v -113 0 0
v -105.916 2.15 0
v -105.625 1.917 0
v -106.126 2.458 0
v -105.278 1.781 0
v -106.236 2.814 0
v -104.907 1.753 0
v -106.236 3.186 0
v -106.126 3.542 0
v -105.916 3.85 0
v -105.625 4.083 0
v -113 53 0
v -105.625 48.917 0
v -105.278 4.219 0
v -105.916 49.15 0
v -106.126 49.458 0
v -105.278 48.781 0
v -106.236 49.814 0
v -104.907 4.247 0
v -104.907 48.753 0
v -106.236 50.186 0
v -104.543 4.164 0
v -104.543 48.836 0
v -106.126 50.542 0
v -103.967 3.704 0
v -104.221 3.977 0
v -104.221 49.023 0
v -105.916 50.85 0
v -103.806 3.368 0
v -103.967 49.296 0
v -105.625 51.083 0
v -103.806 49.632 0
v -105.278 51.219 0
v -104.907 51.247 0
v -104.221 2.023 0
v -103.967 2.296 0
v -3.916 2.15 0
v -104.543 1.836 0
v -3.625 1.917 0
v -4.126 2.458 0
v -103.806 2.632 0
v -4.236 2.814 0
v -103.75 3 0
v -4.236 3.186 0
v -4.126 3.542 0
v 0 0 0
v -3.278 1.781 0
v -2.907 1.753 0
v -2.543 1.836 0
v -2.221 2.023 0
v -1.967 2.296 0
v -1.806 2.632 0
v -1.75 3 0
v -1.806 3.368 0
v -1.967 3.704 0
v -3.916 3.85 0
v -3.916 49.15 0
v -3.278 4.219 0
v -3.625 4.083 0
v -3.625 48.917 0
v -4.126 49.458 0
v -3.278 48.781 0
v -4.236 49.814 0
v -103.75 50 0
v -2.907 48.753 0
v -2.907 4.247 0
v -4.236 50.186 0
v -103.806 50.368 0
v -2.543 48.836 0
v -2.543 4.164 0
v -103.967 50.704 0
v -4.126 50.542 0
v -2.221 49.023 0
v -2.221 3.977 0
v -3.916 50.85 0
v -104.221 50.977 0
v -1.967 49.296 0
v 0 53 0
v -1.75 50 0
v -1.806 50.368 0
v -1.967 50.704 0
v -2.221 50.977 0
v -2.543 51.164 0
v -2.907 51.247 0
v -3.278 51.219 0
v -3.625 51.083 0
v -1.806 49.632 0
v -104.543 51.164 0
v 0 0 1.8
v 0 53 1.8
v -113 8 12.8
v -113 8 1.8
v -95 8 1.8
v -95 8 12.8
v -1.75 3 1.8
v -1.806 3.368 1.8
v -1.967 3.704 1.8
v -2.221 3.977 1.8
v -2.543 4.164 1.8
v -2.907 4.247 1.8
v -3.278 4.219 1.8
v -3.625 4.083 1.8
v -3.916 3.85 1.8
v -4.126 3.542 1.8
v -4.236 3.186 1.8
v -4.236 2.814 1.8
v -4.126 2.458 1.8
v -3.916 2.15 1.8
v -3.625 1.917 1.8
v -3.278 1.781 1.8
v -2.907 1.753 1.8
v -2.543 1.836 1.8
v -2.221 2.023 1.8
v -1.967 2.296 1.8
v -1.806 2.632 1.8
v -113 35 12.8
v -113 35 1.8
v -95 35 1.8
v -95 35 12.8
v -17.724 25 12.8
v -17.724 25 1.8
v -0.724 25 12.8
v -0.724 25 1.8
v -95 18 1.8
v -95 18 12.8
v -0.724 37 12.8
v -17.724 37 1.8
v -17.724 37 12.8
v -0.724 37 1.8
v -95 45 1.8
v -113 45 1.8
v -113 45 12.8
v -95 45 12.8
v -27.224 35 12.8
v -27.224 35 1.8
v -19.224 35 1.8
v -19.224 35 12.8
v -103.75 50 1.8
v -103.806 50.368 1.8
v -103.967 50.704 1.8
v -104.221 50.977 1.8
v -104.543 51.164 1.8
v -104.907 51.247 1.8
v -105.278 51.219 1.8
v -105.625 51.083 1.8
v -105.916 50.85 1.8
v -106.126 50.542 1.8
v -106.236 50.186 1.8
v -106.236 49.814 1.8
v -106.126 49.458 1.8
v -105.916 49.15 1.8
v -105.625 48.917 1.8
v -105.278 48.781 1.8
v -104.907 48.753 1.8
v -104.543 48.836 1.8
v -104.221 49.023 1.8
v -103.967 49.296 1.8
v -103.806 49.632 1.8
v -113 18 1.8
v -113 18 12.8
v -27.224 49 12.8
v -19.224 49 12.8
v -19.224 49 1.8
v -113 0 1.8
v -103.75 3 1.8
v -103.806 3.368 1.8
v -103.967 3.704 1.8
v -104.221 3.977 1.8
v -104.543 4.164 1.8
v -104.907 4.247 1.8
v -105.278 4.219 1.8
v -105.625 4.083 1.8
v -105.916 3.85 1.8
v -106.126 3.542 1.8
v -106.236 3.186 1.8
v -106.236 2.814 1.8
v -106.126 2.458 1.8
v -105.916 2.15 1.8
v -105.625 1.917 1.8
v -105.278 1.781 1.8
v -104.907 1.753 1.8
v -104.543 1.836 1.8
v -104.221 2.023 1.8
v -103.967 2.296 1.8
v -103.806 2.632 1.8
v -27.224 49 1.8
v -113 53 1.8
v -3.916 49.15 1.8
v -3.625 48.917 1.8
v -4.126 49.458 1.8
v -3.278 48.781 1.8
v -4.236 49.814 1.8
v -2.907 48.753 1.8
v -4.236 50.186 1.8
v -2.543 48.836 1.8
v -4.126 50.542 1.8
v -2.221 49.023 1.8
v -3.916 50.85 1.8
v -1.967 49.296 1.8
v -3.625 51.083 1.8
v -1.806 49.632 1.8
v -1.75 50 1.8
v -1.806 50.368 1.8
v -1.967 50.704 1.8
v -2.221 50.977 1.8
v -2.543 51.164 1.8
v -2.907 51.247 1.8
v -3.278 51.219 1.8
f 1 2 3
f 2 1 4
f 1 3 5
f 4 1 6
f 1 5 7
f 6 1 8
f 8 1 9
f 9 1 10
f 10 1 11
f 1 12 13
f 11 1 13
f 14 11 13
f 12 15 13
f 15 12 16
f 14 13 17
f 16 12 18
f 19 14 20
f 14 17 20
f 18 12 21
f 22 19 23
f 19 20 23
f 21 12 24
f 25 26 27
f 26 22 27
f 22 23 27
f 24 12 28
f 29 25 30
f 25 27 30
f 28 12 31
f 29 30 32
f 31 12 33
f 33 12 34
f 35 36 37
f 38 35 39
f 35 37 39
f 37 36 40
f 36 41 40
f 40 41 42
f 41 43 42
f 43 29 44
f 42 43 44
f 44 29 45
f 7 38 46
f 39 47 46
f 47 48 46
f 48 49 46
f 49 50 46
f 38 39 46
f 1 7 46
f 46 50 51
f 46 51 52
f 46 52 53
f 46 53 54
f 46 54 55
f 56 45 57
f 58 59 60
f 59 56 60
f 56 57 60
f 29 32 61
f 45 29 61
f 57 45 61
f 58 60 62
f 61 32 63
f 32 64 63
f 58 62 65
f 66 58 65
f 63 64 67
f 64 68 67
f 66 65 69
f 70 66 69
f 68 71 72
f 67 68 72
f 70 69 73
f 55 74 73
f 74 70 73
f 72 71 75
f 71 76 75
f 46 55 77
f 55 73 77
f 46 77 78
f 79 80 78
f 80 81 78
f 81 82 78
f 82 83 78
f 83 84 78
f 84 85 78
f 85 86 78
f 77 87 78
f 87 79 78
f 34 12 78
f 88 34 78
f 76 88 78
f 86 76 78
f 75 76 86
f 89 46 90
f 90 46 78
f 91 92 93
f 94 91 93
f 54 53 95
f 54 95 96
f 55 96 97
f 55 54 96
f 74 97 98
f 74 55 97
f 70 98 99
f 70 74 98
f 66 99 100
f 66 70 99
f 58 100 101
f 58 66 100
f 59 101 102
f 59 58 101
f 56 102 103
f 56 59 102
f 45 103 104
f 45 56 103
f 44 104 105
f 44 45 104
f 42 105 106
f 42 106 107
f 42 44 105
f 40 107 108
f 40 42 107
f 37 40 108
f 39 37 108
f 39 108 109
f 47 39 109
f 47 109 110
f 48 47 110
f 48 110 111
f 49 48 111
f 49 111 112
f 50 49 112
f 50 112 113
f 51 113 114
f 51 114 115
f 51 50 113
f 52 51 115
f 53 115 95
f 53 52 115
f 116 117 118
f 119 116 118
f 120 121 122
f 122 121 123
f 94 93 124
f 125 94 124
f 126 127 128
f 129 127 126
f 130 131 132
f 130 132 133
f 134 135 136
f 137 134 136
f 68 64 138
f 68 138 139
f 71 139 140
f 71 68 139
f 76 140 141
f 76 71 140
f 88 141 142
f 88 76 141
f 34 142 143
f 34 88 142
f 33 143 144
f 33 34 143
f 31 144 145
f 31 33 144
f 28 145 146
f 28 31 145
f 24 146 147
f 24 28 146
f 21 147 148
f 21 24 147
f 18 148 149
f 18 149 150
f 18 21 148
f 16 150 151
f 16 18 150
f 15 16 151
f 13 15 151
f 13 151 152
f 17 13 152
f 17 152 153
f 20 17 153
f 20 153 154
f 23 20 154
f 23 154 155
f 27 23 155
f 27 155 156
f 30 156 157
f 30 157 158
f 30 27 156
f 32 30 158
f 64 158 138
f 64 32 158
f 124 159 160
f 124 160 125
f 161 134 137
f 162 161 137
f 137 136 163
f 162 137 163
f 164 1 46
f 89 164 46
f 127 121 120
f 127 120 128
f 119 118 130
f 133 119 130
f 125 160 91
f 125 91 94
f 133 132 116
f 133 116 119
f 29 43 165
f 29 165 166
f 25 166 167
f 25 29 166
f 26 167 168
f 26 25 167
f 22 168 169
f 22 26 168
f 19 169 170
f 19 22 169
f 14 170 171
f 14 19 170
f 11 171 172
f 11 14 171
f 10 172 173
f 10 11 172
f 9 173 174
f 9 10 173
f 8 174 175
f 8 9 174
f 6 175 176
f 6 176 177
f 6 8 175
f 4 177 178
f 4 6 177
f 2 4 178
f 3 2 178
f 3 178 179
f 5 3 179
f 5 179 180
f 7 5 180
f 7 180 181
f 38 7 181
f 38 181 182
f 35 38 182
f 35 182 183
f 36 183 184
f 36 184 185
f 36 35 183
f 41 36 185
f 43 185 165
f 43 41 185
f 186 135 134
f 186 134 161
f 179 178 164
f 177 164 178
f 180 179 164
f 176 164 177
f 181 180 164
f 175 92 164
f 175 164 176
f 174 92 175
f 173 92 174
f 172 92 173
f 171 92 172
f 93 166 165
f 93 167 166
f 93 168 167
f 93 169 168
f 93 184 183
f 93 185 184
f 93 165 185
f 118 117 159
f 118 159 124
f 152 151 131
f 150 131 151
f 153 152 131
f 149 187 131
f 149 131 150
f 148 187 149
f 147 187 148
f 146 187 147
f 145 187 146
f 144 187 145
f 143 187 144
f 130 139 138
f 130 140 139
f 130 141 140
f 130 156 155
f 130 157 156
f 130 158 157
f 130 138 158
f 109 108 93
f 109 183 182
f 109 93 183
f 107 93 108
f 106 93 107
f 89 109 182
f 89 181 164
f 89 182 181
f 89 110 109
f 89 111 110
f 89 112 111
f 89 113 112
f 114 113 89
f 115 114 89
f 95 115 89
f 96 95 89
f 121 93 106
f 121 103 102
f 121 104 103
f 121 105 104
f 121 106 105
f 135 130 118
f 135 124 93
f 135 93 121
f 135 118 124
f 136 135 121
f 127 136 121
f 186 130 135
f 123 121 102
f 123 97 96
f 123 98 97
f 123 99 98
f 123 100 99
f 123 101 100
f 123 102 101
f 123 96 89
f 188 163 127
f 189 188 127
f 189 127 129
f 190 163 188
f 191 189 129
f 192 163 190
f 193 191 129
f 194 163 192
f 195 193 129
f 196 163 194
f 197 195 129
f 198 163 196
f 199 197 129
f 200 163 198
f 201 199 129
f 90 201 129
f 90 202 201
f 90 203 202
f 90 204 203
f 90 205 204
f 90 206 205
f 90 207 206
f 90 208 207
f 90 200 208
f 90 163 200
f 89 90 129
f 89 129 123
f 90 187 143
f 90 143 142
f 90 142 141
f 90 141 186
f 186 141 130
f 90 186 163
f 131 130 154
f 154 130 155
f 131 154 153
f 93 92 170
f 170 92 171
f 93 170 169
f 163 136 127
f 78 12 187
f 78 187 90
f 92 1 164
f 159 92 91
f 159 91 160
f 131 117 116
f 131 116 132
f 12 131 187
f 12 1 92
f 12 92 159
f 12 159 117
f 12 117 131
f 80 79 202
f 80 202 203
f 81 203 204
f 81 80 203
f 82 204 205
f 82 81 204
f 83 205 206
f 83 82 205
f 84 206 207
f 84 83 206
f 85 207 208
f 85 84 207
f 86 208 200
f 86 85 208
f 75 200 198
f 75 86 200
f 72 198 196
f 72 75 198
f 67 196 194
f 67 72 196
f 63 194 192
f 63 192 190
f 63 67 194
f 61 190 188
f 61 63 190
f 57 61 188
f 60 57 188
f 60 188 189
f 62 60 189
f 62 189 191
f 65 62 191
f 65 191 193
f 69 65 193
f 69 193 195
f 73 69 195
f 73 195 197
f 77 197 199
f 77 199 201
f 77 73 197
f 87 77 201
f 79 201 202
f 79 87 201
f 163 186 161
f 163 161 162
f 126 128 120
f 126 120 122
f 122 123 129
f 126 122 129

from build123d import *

# Parameters (mm, degrees)
SKETCH1_W           = 113
SKETCH1_H           = 53
SKETCH1_R           = 1.25
BOSS_EXTRUDE1_DEPTH = 1.8
SKETCH2_W           = 17
SKETCH2_H           = 12
SKETCH2_W_2         = 8
SKETCH2_H_2         = 14
SKETCH2_W_3         = 18
SKETCH2_H_3         = 10
BOSS_EXTRUDE2_DEPTH = 11


with BuildPart() as part:
    # Sketch1 → Boss-Extrude1 (new body)
    with BuildSketch(Plane.XY):
        with Locations((-56.5, 26.5)):
            Rectangle(SKETCH1_W, SKETCH1_H)
        with Locations((-3, 3)):
            Circle(SKETCH1_R, mode=Mode.SUBTRACT)
        with Locations((-3, 50)):
            Circle(SKETCH1_R, mode=Mode.SUBTRACT)
        with Locations((-105, 50)):
            Circle(SKETCH1_R, mode=Mode.SUBTRACT)
        with Locations((-105, 3)):
            Circle(SKETCH1_R, mode=Mode.SUBTRACT)
    extrude(amount=BOSS_EXTRUDE1_DEPTH)

    # Sketch2 → Boss-Extrude2 (add)
    with BuildSketch(Plane.XY.offset(1.8)):
        with Locations((-9.223845793, 31)):
            Rectangle(SKETCH2_W, SKETCH2_H)
        with Locations((-23.223845793, 42)):
            Rectangle(SKETCH2_W_2, SKETCH2_H_2)
        with Locations((-104, 40)):
            Rectangle(SKETCH2_W_3, SKETCH2_H_3)
        with Locations((-104, 13)):
            Rectangle(SKETCH2_W_3, SKETCH2_H_3)
    extrude(amount=BOSS_EXTRUDE2_DEPTH)


solid = part.part
